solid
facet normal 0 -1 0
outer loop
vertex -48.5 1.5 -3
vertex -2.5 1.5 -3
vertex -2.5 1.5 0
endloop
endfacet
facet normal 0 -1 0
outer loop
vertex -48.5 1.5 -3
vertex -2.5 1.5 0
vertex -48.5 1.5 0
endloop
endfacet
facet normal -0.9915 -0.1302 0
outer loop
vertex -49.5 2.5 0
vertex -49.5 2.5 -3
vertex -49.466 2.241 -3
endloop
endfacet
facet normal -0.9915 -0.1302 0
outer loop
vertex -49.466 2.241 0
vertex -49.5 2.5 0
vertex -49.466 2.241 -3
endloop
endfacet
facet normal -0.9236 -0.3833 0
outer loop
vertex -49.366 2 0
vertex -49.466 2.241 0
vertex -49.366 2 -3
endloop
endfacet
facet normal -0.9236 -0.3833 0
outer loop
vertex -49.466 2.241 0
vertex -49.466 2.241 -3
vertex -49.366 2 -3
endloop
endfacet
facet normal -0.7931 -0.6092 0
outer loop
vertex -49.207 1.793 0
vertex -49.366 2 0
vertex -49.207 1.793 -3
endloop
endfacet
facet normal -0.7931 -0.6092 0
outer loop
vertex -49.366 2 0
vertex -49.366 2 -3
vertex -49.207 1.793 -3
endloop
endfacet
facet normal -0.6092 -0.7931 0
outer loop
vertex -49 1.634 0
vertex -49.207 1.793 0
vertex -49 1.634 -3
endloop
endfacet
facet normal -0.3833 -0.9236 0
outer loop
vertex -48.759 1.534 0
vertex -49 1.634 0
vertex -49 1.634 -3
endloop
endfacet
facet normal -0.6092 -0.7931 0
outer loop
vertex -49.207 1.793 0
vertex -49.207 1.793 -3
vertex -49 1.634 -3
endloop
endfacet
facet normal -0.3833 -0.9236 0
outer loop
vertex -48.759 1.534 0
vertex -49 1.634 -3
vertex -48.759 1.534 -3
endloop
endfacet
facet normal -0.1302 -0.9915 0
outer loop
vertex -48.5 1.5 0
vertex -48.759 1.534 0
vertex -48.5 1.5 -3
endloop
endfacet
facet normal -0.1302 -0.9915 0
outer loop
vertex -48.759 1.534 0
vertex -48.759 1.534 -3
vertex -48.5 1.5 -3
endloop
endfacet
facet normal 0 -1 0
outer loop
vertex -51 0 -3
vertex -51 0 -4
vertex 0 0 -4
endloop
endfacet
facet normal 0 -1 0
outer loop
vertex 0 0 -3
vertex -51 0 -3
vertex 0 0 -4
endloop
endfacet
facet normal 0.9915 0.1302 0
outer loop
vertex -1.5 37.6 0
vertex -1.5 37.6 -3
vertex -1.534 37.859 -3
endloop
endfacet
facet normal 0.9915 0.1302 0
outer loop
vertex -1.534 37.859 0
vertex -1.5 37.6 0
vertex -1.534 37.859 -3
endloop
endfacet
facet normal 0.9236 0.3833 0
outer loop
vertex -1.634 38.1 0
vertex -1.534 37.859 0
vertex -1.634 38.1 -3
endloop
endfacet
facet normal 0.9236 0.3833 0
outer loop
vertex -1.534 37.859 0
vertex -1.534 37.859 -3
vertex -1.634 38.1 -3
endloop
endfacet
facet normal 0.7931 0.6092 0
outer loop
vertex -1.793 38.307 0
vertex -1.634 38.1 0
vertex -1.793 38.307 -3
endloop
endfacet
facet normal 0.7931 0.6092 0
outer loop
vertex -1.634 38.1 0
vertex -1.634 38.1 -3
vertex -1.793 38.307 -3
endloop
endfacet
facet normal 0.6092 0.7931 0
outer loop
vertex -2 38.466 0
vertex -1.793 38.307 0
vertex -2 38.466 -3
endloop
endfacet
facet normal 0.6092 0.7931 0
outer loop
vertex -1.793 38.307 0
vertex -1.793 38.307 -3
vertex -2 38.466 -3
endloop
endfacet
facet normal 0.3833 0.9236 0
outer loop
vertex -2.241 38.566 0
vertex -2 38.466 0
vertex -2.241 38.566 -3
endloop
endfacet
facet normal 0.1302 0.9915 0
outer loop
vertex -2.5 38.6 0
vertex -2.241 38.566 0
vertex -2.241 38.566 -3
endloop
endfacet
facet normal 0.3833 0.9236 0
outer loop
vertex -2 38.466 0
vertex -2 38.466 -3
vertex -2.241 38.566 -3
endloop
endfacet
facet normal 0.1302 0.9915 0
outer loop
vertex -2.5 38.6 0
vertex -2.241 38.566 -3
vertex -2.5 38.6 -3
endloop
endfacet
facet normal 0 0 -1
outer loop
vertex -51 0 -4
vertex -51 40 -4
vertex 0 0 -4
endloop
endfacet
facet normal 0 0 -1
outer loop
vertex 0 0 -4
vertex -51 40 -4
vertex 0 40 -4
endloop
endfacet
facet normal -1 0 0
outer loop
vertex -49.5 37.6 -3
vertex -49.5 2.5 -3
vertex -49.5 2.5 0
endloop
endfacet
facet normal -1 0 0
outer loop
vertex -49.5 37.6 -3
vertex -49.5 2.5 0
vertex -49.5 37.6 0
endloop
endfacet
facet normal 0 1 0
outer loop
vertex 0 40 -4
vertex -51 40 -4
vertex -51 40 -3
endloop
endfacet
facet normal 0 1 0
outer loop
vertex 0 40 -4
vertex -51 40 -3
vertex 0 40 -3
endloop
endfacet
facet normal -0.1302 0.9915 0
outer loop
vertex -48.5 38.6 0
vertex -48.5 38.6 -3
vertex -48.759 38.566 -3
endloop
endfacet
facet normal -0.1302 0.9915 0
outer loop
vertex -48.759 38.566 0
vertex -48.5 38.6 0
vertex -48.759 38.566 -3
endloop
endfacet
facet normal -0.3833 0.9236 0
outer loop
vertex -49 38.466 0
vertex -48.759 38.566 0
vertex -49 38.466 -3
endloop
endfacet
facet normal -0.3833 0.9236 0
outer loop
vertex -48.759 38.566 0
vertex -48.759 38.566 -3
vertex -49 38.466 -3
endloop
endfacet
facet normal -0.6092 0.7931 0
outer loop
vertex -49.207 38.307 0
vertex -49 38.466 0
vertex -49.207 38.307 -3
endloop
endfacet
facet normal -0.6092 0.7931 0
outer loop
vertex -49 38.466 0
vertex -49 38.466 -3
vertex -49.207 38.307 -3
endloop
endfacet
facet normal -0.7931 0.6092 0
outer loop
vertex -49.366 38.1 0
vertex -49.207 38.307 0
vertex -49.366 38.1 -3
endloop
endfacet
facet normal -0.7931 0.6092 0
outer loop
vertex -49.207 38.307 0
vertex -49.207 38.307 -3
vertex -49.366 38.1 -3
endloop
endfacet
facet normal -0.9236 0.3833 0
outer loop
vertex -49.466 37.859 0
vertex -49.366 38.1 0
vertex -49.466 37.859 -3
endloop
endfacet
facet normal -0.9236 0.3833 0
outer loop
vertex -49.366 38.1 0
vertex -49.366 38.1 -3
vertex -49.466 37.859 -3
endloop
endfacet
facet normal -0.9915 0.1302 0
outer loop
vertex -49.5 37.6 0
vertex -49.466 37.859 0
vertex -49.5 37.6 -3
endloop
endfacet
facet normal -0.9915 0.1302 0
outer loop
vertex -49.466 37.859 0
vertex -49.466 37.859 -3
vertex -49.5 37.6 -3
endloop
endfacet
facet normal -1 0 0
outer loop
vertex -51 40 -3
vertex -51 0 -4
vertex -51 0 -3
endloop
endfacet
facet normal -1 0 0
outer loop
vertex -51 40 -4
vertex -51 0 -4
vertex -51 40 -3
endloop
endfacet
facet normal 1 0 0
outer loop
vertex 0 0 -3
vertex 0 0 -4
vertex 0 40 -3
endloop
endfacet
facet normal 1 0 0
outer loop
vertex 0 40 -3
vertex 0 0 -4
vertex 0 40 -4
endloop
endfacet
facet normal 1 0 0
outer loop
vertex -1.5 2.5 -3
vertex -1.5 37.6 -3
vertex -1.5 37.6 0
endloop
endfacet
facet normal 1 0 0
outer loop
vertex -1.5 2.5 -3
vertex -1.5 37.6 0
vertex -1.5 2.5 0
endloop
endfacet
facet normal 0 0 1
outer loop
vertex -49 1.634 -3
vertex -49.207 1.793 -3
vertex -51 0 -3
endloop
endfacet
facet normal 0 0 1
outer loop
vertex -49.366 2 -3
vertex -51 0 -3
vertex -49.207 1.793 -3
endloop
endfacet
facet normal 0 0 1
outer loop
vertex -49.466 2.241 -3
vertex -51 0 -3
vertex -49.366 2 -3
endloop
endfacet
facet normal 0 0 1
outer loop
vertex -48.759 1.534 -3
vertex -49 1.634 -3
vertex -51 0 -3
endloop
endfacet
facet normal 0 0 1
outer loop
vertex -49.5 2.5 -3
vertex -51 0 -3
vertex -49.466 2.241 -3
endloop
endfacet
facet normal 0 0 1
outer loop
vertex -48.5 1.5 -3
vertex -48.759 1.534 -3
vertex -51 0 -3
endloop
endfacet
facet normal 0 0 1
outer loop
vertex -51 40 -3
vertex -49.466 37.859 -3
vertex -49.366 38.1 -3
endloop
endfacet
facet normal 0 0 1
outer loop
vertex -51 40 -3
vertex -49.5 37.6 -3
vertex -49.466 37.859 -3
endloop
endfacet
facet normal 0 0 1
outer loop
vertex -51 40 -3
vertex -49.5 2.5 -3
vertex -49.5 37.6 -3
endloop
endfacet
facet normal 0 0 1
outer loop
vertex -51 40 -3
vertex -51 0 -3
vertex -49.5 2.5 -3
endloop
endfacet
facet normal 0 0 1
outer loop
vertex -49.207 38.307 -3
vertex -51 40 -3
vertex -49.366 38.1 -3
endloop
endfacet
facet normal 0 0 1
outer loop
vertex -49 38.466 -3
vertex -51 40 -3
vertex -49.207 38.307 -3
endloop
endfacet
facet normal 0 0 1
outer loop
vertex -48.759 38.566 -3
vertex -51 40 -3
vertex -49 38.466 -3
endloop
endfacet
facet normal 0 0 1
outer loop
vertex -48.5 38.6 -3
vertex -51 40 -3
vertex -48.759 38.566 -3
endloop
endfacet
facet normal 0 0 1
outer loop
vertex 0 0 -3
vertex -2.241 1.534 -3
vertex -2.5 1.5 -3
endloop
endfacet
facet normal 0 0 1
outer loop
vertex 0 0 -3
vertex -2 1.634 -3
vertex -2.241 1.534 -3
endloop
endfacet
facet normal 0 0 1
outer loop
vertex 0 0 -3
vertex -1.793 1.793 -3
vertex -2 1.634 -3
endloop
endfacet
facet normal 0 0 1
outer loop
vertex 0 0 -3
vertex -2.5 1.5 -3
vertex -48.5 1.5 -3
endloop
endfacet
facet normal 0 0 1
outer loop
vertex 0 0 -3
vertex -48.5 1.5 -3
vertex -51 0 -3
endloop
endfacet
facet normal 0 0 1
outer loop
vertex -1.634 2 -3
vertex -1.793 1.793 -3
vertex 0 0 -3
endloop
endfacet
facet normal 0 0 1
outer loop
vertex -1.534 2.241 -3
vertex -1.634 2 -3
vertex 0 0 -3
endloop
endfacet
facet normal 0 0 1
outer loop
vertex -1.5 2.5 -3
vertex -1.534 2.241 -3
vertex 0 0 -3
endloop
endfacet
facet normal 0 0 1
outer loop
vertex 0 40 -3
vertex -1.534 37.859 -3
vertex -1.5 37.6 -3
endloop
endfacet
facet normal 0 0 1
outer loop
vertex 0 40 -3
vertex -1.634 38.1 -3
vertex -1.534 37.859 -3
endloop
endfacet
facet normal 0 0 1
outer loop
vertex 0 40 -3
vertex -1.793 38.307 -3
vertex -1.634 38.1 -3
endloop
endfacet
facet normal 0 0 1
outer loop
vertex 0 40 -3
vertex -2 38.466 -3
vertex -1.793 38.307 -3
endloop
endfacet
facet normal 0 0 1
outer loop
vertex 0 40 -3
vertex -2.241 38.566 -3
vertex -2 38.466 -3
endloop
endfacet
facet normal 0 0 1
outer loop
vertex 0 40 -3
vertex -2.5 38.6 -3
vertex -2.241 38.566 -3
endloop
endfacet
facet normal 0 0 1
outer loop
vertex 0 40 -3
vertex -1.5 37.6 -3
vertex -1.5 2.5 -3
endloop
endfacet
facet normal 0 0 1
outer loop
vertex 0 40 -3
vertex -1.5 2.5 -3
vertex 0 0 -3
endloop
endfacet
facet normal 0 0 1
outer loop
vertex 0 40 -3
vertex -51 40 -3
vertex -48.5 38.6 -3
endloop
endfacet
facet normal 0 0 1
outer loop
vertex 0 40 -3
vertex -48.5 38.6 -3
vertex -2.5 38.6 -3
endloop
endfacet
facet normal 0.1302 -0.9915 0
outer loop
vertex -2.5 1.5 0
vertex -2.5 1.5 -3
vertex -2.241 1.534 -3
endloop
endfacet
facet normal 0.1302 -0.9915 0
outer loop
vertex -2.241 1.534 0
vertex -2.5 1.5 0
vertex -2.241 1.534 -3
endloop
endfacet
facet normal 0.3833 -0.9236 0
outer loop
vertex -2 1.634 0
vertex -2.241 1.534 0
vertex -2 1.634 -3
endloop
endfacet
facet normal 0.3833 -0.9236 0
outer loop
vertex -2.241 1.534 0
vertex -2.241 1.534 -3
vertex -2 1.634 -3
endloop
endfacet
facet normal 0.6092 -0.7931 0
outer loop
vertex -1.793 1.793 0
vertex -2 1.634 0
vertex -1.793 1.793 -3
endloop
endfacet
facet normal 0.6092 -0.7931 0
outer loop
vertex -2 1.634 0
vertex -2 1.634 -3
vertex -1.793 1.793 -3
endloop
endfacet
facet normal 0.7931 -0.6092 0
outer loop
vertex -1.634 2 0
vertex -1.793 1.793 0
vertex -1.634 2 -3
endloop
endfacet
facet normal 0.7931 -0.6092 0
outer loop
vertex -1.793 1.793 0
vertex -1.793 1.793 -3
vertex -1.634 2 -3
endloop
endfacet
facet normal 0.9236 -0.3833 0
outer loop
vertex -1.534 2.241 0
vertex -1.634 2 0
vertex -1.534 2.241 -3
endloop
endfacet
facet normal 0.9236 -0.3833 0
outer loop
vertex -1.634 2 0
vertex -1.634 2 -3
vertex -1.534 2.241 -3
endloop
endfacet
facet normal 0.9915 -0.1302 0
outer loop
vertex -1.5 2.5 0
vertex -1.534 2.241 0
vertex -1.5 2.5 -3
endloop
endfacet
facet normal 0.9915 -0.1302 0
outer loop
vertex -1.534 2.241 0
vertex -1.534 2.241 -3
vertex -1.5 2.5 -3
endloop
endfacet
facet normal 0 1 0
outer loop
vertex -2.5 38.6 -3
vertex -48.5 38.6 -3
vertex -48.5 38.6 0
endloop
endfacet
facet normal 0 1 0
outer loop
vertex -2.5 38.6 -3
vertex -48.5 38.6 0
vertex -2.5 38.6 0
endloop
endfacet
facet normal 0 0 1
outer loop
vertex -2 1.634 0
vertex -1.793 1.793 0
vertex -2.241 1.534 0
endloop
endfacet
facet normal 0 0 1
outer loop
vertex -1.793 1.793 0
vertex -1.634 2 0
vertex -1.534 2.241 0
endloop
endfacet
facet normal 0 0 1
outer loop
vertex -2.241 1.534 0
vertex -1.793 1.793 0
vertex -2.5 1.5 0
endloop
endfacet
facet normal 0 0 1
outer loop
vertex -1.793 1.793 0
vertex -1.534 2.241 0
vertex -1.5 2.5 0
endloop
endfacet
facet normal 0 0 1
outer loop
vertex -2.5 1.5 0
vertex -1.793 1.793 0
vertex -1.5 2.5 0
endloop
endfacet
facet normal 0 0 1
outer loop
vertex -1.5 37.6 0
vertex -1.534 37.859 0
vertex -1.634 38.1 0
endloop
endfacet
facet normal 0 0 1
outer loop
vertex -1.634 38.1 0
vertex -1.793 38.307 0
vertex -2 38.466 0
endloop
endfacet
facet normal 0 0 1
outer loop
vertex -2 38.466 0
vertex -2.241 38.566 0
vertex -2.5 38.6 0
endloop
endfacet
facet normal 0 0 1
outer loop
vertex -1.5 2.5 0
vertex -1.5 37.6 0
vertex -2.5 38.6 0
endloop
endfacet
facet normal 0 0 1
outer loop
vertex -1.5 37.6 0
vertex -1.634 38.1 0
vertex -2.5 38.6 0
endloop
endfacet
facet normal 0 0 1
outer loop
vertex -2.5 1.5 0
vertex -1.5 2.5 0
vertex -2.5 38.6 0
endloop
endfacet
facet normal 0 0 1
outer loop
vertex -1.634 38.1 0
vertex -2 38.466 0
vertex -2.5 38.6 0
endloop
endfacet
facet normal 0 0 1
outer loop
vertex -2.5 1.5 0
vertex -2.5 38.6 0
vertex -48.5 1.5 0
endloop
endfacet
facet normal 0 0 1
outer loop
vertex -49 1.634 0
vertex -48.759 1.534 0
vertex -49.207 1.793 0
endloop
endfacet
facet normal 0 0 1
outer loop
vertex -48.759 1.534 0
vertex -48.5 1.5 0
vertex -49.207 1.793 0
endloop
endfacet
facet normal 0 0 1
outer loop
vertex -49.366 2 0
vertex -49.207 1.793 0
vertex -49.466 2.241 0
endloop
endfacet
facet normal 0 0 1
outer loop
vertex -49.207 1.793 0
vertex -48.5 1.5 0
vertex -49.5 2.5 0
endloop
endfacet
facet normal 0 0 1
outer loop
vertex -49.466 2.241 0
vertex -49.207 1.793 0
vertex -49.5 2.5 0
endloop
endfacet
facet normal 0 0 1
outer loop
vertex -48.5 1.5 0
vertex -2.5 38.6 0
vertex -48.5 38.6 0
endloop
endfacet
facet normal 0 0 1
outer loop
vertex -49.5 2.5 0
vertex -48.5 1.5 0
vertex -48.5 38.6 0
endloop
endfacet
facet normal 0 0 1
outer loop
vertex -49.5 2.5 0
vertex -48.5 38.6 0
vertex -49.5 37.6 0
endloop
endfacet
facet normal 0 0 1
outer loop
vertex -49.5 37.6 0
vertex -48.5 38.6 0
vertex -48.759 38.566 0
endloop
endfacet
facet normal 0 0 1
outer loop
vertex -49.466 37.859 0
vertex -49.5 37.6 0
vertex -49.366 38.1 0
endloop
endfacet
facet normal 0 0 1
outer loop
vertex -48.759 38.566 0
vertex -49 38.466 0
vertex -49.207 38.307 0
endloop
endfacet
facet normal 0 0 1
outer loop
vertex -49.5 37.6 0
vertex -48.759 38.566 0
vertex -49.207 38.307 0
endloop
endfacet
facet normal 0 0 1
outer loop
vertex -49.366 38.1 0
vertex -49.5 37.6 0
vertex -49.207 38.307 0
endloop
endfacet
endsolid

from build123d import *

# Parameters (mm, degrees)
SKETCH_W     = 51
SKETCH_H     = 40
PAD_DEPTH    = 1
PAD001_DEPTH = 3


with BuildPart() as part:
    # Sketch → Pad (new body)
    with BuildSketch(Plane.XY):
        with Locations((-25.5, 20)):
            Rectangle(SKETCH_W, SKETCH_H)
    extrude(amount=PAD_DEPTH)

    # Sketch001 (on DatumPlane) → Pad001 (join)
    with BuildSketch(Plane.XY.offset(1)):
        with BuildLine():
            Line((-48.5, 38.6), (-2.5, 38.6))
            ThreePointArc((-1.5, 37.6), (-1.792893, 38.307107), (-2.5, 38.6))
            Line((-1.5, 37.6), (-1.5, 2.5))
            ThreePointArc((-2.5, 1.5), (-1.792893, 1.792893), (-1.5, 2.5))
            Line((-2.5, 1.5), (-48.5, 1.5))
            ThreePointArc((-49.5, 2.5), (-49.207107, 1.792893), (-48.5, 1.5))
            Line((-49.5, 2.5), (-49.5, 37.6))
            ThreePointArc((-48.5, 38.6), (-49.207107, 38.307107), (-49.5, 37.6))
        make_face()
    extrude(amount=PAD001_DEPTH)


with BuildPart() as part_1:
    # Body placement: moved
    add(part.part.moved(Location((0, 0, -4))))


solid = part_1.part
